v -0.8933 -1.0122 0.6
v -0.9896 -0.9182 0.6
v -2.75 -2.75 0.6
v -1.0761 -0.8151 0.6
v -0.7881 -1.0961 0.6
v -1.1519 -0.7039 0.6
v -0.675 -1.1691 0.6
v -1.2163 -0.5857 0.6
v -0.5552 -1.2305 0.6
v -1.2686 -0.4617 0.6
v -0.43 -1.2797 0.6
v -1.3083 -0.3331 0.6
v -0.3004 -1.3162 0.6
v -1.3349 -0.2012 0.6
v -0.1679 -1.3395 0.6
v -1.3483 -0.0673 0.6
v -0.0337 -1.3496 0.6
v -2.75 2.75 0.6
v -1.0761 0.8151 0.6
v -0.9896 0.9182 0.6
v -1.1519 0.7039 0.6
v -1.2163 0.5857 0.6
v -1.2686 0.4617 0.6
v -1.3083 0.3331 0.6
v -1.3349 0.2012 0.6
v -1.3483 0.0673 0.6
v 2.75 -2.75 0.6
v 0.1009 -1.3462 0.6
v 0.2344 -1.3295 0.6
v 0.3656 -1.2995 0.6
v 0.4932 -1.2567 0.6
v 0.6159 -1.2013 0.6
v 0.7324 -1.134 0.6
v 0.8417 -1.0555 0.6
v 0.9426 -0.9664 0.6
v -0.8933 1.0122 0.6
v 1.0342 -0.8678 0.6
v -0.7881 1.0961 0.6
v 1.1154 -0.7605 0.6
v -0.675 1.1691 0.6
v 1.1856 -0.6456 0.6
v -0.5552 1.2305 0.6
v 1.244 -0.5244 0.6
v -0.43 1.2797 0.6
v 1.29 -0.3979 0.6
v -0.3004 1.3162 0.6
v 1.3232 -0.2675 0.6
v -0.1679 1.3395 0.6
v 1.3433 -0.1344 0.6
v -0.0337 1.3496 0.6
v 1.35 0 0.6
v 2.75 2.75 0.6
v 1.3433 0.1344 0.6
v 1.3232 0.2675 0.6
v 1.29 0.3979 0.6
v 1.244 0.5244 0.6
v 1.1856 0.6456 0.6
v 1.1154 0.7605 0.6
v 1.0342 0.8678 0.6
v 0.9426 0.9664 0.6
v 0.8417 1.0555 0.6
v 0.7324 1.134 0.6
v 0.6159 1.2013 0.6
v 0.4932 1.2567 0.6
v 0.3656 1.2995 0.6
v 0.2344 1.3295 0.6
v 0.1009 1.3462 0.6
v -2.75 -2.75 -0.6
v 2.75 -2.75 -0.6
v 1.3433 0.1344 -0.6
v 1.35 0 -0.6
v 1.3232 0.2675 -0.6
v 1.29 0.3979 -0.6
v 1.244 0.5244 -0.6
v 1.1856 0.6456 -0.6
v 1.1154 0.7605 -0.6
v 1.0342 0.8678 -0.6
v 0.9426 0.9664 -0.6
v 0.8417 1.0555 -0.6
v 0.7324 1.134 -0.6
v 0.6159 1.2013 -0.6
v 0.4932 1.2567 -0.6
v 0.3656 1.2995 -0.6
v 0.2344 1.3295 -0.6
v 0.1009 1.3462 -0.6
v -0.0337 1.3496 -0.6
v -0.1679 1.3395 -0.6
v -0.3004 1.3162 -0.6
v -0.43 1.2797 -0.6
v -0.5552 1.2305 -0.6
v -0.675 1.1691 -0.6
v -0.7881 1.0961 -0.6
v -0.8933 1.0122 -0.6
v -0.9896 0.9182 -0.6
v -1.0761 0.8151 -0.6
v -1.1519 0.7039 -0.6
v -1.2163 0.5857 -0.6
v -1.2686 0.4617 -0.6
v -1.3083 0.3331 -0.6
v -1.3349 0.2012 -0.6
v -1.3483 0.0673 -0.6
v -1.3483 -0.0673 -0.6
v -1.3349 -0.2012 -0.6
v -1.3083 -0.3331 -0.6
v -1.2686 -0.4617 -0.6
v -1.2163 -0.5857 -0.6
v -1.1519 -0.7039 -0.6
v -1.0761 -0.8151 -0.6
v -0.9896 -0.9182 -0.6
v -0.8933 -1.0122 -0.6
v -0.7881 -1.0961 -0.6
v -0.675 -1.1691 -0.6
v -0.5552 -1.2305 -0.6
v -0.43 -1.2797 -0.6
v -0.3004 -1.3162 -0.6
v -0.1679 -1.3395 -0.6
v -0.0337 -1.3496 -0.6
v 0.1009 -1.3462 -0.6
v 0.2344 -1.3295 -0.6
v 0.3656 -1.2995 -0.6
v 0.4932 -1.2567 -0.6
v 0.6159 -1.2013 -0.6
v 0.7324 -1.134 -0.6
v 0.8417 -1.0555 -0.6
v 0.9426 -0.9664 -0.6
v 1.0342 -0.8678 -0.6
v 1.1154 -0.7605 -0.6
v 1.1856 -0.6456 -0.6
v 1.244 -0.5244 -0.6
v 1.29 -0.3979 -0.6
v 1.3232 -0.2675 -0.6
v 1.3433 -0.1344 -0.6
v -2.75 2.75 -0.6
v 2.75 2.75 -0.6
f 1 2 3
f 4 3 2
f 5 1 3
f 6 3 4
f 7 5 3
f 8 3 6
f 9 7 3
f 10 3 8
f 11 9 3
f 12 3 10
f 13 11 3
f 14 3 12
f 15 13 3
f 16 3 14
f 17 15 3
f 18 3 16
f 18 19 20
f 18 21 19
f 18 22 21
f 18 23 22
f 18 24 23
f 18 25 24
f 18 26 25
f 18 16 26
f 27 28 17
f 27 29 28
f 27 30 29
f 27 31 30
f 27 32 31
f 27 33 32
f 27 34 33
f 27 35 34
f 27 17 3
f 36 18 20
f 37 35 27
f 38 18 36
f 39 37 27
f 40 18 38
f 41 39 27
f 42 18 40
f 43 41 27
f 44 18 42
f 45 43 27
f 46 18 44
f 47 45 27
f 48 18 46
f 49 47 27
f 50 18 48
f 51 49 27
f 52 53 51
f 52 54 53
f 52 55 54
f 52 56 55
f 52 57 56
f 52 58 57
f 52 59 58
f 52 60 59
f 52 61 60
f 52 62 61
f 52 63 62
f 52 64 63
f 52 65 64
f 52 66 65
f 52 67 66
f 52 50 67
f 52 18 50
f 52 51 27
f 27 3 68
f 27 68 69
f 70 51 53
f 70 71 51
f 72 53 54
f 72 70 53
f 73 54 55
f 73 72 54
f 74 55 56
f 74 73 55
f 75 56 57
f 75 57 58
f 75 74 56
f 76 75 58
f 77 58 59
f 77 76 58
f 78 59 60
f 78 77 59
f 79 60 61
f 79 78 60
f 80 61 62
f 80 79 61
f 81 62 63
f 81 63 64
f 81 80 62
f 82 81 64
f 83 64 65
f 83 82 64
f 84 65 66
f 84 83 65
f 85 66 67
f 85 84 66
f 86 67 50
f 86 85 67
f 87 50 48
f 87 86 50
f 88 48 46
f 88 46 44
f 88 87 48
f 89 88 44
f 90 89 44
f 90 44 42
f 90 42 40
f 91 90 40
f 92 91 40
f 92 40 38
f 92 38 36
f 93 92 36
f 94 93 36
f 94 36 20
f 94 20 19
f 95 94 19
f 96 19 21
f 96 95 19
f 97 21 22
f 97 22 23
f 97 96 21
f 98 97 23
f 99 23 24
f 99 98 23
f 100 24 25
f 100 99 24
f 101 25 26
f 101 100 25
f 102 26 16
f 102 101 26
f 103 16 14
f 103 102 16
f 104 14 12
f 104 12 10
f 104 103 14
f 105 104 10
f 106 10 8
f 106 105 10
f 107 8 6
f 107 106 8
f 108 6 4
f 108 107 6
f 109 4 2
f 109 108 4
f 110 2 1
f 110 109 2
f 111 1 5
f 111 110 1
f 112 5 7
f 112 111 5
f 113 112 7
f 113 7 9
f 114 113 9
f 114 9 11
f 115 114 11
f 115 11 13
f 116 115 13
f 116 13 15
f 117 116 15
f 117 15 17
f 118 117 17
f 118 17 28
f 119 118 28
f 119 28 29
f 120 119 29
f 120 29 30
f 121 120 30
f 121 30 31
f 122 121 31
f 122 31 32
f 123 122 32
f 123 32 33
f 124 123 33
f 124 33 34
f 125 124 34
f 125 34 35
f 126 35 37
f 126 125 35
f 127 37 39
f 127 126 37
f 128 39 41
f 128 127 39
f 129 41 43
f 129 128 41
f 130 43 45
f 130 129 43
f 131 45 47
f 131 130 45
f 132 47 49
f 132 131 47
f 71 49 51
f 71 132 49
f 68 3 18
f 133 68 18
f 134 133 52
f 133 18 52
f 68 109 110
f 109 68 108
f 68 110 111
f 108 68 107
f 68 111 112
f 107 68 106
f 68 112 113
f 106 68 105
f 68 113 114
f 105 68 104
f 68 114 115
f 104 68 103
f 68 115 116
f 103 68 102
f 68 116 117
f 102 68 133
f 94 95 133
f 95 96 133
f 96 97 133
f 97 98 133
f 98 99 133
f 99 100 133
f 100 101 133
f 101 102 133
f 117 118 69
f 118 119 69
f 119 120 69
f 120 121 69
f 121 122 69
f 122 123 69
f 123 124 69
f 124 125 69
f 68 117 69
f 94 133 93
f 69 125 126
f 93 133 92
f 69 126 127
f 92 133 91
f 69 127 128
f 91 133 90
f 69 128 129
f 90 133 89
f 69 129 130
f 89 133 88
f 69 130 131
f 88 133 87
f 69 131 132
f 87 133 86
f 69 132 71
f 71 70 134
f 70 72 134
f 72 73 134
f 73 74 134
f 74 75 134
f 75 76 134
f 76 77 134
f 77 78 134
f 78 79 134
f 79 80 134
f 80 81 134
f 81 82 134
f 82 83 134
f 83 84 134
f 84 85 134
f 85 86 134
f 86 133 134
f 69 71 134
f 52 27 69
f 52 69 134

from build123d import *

# Parameters (mm, degrees)
ESBO_O1_W                = 5.5
ESBO_O1_H                = 5.5
ESBO_O1_R                = 1.35
RESSALTO_EXTRUS_O1_DEPTH = 0.6


with BuildPart() as part:
    # Esboço1 → Ressalto-extrusão1 (new, symmetric)
    with BuildSketch(Plane.XY):
        Rectangle(ESBO_O1_W, ESBO_O1_H)
        Circle(ESBO_O1_R, mode=Mode.SUBTRACT)
    extrude(amount=RESSALTO_EXTRUS_O1_DEPTH, both=True)


solid = part.part
